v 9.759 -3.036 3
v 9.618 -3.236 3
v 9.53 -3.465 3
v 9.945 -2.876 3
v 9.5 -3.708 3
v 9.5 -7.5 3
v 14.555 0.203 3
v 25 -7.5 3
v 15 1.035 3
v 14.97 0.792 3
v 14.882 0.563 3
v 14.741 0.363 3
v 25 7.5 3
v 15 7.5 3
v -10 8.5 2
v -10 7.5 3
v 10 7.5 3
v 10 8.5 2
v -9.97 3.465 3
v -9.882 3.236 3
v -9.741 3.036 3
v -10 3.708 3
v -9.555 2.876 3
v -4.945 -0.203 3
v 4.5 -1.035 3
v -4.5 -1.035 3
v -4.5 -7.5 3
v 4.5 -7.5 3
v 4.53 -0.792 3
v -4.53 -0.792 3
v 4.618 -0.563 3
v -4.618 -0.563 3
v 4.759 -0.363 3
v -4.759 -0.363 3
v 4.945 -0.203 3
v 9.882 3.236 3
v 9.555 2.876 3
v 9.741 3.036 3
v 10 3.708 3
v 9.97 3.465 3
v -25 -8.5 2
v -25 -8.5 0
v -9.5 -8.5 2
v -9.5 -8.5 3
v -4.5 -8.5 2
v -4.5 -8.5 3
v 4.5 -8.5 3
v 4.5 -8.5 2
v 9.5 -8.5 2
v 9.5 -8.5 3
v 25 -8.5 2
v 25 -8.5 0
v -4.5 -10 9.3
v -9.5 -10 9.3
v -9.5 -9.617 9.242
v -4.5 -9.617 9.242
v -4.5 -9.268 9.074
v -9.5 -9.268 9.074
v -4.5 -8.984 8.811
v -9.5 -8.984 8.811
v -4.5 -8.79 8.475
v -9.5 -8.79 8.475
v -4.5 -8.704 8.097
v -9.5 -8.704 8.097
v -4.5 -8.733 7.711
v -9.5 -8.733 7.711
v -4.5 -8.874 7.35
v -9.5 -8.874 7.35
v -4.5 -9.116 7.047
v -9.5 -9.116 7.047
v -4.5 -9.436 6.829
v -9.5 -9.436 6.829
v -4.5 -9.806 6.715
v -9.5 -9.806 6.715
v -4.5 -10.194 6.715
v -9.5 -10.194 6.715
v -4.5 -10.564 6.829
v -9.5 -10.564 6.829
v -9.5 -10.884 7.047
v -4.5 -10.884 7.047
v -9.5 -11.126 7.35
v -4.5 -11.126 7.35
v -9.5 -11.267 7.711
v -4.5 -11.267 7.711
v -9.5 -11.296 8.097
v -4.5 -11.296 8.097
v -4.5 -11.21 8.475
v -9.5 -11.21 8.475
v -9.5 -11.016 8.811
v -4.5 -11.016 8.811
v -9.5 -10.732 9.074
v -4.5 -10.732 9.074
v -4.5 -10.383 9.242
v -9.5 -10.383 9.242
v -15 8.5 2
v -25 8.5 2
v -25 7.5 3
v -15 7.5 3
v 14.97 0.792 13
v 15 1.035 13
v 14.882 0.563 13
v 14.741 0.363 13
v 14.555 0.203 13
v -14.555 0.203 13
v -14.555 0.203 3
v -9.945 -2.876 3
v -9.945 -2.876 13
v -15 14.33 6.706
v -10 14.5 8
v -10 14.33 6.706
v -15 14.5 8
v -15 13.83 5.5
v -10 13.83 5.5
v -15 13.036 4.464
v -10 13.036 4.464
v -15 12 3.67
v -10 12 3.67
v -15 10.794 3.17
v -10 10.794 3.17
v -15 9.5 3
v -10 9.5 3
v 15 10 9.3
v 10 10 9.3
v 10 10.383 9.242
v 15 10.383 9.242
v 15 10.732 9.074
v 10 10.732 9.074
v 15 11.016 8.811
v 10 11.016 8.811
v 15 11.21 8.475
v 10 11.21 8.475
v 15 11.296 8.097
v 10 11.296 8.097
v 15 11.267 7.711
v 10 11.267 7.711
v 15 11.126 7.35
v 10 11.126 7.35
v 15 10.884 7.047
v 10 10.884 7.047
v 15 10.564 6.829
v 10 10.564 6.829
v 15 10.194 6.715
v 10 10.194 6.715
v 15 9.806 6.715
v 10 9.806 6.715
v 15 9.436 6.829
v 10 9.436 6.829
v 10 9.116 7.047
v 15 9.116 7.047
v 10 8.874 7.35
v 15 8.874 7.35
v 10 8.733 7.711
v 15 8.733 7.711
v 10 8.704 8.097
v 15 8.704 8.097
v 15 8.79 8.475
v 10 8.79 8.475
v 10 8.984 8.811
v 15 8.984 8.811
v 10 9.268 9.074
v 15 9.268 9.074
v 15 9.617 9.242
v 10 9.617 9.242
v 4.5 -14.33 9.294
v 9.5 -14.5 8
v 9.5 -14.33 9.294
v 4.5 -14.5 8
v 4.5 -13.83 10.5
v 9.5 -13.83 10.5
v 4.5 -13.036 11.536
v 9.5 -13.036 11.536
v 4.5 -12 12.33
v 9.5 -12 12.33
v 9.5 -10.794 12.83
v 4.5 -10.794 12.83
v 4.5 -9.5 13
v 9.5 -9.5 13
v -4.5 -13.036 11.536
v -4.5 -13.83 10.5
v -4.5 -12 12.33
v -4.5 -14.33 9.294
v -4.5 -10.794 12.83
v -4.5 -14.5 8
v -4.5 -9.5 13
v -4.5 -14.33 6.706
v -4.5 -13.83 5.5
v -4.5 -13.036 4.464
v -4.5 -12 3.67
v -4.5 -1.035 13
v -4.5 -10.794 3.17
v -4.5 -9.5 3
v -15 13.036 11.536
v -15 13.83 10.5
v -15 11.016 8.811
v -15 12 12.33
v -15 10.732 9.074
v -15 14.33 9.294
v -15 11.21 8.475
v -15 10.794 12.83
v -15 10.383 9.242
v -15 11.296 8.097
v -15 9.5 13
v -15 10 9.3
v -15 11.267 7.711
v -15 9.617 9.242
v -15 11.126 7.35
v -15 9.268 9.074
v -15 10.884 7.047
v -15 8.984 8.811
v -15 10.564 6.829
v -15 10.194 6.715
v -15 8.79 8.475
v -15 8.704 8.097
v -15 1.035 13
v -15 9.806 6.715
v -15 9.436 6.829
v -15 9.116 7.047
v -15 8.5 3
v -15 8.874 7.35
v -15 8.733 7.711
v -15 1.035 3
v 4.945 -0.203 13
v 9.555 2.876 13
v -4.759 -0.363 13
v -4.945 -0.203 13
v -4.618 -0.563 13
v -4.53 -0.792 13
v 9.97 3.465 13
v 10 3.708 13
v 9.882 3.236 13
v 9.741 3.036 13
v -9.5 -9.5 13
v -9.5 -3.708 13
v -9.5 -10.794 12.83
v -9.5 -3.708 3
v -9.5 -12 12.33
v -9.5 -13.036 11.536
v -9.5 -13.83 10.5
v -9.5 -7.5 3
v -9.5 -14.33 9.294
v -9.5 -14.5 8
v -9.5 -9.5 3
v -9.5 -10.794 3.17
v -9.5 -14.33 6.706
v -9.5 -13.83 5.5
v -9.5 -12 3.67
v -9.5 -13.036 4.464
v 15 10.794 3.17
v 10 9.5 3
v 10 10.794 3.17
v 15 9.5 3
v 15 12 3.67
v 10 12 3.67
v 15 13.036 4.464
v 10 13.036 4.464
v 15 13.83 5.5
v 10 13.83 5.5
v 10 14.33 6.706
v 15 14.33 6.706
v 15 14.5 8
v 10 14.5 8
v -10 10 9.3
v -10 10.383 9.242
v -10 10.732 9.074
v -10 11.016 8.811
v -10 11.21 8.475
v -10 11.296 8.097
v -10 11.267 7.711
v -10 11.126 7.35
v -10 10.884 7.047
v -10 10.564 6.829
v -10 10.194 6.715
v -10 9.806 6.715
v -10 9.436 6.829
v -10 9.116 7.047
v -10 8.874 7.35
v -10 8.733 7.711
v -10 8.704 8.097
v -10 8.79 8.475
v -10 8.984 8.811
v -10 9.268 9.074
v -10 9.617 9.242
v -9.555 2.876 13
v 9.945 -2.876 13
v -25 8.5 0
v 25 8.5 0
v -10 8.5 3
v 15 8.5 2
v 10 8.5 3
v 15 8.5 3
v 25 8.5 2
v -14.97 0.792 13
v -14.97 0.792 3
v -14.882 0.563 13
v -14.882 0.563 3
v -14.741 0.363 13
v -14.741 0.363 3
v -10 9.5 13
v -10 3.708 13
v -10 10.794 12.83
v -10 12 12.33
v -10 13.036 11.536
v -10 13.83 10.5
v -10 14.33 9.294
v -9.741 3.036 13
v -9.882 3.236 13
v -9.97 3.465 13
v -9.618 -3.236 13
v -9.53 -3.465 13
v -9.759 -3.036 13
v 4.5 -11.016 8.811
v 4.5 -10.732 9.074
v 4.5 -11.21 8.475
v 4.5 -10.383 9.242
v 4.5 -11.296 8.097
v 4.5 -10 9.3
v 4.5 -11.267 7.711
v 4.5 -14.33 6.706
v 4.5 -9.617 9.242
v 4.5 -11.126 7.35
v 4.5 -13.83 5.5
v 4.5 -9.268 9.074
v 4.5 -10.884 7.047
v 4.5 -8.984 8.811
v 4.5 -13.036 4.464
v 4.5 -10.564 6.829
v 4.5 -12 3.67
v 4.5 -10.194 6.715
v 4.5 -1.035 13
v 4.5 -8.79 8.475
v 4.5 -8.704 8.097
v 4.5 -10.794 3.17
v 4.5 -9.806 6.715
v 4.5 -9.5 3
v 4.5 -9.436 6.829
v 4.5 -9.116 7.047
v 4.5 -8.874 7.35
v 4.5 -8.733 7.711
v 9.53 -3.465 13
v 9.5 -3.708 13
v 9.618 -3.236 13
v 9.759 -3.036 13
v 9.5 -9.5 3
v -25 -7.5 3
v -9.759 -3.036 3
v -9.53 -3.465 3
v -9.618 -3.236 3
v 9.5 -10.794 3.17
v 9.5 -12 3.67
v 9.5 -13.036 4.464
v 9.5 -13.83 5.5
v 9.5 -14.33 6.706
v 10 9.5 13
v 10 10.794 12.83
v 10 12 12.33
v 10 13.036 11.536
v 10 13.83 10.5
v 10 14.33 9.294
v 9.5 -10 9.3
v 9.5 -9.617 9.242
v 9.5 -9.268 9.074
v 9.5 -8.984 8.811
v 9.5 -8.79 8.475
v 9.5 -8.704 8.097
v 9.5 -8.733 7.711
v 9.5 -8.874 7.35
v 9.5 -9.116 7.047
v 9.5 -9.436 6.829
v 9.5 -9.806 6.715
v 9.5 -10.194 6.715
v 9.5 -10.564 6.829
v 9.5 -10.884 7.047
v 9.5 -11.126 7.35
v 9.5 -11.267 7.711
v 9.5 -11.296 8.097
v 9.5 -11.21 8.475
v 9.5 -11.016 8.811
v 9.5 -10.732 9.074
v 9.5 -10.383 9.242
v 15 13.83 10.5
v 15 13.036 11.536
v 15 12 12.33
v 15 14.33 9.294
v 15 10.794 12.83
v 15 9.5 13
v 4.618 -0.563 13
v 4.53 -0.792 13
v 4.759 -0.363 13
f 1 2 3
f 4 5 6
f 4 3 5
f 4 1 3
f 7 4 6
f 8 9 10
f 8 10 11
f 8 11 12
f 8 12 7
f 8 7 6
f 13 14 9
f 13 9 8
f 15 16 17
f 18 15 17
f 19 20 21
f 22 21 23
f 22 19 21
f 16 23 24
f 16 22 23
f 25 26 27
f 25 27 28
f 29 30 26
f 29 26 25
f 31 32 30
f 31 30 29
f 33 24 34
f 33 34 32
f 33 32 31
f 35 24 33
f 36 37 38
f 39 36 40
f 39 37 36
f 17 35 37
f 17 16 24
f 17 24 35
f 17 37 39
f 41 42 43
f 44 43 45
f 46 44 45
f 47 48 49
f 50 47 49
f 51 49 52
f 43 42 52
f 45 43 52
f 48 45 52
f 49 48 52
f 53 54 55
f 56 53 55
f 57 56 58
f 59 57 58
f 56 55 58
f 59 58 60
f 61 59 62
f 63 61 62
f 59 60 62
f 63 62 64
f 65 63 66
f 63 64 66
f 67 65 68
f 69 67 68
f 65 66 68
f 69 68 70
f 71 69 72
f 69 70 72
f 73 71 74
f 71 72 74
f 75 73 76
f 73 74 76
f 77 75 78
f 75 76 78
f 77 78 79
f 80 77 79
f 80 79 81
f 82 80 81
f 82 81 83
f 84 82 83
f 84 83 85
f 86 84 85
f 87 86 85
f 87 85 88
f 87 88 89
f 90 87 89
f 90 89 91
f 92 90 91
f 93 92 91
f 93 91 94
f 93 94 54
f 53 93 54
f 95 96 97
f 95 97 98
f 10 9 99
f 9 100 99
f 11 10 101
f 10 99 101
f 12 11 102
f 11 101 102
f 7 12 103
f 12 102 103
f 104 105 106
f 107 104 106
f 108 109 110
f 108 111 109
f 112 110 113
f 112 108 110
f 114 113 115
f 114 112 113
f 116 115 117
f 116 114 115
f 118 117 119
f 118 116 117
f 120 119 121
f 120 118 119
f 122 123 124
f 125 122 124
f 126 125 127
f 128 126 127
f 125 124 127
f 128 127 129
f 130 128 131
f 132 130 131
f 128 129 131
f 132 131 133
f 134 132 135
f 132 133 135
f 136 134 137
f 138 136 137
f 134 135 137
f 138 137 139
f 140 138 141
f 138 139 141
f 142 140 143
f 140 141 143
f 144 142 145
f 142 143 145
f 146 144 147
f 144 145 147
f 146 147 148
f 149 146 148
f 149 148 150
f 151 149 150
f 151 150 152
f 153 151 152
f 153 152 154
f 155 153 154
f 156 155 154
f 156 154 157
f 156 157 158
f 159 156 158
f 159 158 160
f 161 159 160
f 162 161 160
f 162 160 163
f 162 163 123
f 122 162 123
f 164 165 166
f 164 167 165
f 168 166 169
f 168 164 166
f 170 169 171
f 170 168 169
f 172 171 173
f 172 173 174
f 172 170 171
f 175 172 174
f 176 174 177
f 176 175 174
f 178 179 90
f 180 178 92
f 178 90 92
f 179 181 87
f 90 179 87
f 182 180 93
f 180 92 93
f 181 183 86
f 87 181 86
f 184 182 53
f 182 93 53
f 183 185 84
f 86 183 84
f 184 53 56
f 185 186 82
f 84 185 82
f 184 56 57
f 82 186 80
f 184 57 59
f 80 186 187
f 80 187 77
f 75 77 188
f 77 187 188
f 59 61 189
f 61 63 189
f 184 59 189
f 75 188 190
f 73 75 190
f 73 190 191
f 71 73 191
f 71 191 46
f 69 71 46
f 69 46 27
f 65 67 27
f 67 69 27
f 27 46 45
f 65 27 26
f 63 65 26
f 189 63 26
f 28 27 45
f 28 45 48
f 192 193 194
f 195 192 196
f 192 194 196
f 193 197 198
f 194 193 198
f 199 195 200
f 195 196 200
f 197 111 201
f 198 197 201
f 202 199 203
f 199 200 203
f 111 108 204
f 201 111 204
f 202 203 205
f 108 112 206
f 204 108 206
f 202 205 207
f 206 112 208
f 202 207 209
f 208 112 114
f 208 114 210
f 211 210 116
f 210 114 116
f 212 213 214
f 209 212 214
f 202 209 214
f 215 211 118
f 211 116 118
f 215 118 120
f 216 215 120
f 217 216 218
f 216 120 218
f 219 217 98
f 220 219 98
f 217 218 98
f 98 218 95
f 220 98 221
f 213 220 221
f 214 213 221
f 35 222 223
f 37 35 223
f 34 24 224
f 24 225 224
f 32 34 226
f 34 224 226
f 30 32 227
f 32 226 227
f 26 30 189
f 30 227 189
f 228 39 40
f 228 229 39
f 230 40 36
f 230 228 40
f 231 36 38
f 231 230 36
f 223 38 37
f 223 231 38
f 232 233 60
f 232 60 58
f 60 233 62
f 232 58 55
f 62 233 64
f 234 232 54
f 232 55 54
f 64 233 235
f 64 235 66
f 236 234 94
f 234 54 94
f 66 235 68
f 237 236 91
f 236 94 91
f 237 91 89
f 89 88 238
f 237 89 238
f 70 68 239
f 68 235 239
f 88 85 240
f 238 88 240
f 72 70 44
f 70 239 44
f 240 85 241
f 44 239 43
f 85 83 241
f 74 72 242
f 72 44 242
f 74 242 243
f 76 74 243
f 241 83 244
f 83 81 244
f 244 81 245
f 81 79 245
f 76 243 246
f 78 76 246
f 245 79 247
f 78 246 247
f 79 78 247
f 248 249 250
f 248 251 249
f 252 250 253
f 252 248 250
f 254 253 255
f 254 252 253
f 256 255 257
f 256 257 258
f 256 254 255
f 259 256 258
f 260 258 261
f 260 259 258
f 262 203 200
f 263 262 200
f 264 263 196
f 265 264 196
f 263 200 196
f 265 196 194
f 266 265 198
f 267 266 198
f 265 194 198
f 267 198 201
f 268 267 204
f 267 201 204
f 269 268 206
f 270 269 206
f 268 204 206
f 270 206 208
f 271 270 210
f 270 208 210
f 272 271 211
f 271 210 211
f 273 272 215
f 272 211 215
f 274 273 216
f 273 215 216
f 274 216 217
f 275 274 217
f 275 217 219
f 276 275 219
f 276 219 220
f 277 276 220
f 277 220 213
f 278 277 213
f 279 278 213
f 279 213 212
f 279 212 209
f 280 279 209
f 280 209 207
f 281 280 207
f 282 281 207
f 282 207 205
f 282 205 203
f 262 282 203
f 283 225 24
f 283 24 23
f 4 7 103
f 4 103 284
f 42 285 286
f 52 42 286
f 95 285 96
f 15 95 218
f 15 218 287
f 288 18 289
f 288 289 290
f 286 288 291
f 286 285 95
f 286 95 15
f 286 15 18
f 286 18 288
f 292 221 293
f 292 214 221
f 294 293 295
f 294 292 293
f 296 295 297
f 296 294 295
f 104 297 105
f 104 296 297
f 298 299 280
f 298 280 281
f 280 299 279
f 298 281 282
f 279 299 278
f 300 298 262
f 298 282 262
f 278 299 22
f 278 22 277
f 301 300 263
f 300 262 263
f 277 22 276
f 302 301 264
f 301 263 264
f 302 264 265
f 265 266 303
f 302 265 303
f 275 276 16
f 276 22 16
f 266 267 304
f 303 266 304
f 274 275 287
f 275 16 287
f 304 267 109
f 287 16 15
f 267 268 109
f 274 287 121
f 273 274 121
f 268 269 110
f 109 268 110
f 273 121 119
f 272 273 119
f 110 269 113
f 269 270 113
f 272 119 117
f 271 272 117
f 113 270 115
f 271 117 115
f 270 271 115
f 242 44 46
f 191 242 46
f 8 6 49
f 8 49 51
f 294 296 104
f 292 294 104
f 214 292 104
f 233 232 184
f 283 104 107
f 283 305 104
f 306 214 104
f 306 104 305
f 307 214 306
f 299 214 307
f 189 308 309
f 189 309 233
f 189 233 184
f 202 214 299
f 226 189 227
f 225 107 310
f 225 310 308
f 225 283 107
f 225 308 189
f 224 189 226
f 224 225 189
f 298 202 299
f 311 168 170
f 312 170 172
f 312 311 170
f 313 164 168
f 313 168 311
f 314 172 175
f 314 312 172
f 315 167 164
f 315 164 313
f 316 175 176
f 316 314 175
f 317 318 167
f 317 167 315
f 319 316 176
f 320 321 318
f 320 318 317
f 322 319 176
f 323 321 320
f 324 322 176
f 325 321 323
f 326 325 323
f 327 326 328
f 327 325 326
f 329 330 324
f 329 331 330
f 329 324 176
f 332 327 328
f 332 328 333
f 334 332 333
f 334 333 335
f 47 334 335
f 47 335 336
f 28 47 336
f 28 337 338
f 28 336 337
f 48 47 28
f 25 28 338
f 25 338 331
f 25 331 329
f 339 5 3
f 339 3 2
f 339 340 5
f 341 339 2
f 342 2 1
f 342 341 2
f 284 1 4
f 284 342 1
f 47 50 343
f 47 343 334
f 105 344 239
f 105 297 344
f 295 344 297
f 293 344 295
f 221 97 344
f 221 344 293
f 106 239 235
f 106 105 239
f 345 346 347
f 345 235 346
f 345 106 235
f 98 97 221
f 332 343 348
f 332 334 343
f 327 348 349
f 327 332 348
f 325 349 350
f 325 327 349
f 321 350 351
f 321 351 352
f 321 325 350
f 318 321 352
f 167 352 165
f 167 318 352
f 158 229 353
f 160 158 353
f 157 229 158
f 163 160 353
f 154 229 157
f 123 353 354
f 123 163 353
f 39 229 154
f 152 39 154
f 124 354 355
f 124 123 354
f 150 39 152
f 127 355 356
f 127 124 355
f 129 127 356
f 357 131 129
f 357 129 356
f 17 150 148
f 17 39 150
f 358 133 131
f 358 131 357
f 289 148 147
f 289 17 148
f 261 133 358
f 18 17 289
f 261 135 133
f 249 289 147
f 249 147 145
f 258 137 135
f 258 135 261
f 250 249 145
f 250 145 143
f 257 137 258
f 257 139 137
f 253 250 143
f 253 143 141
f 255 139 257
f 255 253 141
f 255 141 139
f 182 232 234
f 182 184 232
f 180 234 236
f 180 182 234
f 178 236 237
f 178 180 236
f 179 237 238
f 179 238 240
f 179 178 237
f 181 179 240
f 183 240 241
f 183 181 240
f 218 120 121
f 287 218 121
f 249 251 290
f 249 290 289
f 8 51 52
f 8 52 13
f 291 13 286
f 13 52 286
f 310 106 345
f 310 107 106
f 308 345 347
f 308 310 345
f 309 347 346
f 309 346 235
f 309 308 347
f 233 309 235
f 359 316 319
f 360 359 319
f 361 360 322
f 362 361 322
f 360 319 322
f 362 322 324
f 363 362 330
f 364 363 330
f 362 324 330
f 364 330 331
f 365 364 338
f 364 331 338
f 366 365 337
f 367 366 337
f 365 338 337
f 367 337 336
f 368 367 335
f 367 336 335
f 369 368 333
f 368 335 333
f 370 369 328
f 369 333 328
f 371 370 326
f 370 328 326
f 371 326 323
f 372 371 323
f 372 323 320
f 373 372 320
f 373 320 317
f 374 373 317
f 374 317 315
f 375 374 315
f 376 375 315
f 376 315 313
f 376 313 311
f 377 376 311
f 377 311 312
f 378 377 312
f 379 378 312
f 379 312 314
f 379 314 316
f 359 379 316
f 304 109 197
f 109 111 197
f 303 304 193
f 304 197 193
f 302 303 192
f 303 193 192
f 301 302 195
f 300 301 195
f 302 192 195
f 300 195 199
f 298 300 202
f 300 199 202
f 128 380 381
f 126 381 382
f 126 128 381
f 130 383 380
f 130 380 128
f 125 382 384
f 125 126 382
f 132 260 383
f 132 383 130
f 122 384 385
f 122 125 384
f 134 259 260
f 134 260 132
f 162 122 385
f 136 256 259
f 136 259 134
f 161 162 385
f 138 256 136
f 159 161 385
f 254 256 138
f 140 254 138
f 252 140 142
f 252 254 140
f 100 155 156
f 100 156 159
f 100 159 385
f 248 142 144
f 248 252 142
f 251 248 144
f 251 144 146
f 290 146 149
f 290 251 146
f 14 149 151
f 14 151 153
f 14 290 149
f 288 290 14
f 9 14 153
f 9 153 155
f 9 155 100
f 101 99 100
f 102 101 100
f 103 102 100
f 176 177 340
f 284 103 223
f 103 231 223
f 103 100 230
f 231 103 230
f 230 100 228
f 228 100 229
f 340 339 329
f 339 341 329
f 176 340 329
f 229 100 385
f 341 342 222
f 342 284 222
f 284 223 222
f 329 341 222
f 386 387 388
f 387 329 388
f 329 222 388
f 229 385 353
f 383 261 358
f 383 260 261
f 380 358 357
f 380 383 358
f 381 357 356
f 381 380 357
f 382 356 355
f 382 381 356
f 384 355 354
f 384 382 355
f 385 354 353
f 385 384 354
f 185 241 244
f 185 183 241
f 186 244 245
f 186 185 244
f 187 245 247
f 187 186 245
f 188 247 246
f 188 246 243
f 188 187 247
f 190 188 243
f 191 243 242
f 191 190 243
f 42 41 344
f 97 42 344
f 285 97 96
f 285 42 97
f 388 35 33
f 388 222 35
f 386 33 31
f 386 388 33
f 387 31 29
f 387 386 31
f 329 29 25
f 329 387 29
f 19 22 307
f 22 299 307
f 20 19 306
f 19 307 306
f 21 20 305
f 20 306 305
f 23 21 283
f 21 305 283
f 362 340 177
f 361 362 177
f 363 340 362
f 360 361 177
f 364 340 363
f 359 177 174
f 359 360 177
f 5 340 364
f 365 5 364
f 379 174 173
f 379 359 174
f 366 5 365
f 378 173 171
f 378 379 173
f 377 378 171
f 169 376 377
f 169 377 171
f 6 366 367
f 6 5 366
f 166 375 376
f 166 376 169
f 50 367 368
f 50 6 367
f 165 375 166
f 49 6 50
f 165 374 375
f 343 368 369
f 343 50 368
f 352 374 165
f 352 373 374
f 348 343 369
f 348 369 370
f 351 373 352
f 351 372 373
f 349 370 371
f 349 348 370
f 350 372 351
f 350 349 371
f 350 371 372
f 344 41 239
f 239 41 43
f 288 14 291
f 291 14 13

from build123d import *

# Parameters (mm, degrees)
ESQUISSE1_W                     = 50
ESQUISSE1_H                     = 17
BOSS_EXTRU_1_DEPTH              = 3
BOSS_EXTRU_2_DEPTH              = 10
CONG_1_R                        = 5
CONG_2_R                        = 1
CHANFREIN1_SIZE                 = 1
DIAM_TRE_DU_PER_AGE_2_6_2_6_1_D = 2.6


with BuildPart() as part:
    # Esquisse1 → Boss.-Extru.1 (new body)
    with BuildSketch(Plane.XY):
        Rectangle(ESQUISSE1_W, ESQUISSE1_H)
    extrude(amount=BOSS_EXTRU_1_DEPTH)

    # Esquisse2 → Boss.-Extru.2 (add)
    with BuildSketch(Plane.XY.offset(3)):
        Polygon((-15, 14.5), (-15, 0.5), (-9.5, -3.173254132), (-9.5, -14.5), (-4.5, -14.5), (-4.5, -0.5), (-10, 3.173254132), (-10, 14.5), align=None)
        Polygon((10, 14.5), (15, 14.5), (15, 0.5), (9.5, -3.173254132), (9.5, -14.5), (4.5, -14.5), (4.5, -0.5), (10, 3.173254132), align=None)
    extrude(amount=BOSS_EXTRU_2_DEPTH)

    # Congé1
    cong_1_edges = [part.edges().sort_by_distance(p)[0] for p in [
        (7, -14.5, 13),
        (7, -14.5, 3),
        (-7, -14.5, 3),
        (-7, -14.5, 13),
        (-12.5, 14.5, 13),
        (12.5, 14.5, 13),
        (12.5, 14.5, 3),
        (-12.5, 14.5, 3),
    ]]
    fillet(cong_1_edges, radius=CONG_1_R - 0.0001)  # a hair under: the kernel refuses the full size

    # Congé2
    cong_2_edges = [part.edges().sort_by_distance(p)[0] for p in [
        (-15, 0.5, 8),
        (-9.5, -3.173254132, 8),
        (-4.5, -0.5, 8),
        (-10, 3.173254132, 8),
        (10, 3.173254132, 8),
        (4.5, -0.5, 8),
        (9.5, -3.173254132, 8),
        (15, 0.5, 8),
    ]]
    fillet(cong_2_edges, radius=CONG_2_R)

    # Chanfrein1
    chanfrein1_edges = [part.edges().sort_by_distance(p)[0] for p in [
        (-17.25, -8.5, 3),
        (-20, 8.5, 3),
        (0, -8.5, 3),
        (17.25, -8.5, 3),
        (0, 8.5, 3),
        (20, 8.5, 3),
    ]]
    chamfer(chanfrein1_edges, length=CHANFREIN1_SIZE)

    # Diamètre du perçage Ø2.6 (2.6)1 (through all)
    with Locations(Plane(origin=(15, 0, 0), x_dir=(0, 0, -1), z_dir=(1, 0, 0))):
        with Locations((-8, -10), (-8, 10)):
            Hole(DIAM_TRE_DU_PER_AGE_2_6_2_6_1_D / 2)


solid = part.part
